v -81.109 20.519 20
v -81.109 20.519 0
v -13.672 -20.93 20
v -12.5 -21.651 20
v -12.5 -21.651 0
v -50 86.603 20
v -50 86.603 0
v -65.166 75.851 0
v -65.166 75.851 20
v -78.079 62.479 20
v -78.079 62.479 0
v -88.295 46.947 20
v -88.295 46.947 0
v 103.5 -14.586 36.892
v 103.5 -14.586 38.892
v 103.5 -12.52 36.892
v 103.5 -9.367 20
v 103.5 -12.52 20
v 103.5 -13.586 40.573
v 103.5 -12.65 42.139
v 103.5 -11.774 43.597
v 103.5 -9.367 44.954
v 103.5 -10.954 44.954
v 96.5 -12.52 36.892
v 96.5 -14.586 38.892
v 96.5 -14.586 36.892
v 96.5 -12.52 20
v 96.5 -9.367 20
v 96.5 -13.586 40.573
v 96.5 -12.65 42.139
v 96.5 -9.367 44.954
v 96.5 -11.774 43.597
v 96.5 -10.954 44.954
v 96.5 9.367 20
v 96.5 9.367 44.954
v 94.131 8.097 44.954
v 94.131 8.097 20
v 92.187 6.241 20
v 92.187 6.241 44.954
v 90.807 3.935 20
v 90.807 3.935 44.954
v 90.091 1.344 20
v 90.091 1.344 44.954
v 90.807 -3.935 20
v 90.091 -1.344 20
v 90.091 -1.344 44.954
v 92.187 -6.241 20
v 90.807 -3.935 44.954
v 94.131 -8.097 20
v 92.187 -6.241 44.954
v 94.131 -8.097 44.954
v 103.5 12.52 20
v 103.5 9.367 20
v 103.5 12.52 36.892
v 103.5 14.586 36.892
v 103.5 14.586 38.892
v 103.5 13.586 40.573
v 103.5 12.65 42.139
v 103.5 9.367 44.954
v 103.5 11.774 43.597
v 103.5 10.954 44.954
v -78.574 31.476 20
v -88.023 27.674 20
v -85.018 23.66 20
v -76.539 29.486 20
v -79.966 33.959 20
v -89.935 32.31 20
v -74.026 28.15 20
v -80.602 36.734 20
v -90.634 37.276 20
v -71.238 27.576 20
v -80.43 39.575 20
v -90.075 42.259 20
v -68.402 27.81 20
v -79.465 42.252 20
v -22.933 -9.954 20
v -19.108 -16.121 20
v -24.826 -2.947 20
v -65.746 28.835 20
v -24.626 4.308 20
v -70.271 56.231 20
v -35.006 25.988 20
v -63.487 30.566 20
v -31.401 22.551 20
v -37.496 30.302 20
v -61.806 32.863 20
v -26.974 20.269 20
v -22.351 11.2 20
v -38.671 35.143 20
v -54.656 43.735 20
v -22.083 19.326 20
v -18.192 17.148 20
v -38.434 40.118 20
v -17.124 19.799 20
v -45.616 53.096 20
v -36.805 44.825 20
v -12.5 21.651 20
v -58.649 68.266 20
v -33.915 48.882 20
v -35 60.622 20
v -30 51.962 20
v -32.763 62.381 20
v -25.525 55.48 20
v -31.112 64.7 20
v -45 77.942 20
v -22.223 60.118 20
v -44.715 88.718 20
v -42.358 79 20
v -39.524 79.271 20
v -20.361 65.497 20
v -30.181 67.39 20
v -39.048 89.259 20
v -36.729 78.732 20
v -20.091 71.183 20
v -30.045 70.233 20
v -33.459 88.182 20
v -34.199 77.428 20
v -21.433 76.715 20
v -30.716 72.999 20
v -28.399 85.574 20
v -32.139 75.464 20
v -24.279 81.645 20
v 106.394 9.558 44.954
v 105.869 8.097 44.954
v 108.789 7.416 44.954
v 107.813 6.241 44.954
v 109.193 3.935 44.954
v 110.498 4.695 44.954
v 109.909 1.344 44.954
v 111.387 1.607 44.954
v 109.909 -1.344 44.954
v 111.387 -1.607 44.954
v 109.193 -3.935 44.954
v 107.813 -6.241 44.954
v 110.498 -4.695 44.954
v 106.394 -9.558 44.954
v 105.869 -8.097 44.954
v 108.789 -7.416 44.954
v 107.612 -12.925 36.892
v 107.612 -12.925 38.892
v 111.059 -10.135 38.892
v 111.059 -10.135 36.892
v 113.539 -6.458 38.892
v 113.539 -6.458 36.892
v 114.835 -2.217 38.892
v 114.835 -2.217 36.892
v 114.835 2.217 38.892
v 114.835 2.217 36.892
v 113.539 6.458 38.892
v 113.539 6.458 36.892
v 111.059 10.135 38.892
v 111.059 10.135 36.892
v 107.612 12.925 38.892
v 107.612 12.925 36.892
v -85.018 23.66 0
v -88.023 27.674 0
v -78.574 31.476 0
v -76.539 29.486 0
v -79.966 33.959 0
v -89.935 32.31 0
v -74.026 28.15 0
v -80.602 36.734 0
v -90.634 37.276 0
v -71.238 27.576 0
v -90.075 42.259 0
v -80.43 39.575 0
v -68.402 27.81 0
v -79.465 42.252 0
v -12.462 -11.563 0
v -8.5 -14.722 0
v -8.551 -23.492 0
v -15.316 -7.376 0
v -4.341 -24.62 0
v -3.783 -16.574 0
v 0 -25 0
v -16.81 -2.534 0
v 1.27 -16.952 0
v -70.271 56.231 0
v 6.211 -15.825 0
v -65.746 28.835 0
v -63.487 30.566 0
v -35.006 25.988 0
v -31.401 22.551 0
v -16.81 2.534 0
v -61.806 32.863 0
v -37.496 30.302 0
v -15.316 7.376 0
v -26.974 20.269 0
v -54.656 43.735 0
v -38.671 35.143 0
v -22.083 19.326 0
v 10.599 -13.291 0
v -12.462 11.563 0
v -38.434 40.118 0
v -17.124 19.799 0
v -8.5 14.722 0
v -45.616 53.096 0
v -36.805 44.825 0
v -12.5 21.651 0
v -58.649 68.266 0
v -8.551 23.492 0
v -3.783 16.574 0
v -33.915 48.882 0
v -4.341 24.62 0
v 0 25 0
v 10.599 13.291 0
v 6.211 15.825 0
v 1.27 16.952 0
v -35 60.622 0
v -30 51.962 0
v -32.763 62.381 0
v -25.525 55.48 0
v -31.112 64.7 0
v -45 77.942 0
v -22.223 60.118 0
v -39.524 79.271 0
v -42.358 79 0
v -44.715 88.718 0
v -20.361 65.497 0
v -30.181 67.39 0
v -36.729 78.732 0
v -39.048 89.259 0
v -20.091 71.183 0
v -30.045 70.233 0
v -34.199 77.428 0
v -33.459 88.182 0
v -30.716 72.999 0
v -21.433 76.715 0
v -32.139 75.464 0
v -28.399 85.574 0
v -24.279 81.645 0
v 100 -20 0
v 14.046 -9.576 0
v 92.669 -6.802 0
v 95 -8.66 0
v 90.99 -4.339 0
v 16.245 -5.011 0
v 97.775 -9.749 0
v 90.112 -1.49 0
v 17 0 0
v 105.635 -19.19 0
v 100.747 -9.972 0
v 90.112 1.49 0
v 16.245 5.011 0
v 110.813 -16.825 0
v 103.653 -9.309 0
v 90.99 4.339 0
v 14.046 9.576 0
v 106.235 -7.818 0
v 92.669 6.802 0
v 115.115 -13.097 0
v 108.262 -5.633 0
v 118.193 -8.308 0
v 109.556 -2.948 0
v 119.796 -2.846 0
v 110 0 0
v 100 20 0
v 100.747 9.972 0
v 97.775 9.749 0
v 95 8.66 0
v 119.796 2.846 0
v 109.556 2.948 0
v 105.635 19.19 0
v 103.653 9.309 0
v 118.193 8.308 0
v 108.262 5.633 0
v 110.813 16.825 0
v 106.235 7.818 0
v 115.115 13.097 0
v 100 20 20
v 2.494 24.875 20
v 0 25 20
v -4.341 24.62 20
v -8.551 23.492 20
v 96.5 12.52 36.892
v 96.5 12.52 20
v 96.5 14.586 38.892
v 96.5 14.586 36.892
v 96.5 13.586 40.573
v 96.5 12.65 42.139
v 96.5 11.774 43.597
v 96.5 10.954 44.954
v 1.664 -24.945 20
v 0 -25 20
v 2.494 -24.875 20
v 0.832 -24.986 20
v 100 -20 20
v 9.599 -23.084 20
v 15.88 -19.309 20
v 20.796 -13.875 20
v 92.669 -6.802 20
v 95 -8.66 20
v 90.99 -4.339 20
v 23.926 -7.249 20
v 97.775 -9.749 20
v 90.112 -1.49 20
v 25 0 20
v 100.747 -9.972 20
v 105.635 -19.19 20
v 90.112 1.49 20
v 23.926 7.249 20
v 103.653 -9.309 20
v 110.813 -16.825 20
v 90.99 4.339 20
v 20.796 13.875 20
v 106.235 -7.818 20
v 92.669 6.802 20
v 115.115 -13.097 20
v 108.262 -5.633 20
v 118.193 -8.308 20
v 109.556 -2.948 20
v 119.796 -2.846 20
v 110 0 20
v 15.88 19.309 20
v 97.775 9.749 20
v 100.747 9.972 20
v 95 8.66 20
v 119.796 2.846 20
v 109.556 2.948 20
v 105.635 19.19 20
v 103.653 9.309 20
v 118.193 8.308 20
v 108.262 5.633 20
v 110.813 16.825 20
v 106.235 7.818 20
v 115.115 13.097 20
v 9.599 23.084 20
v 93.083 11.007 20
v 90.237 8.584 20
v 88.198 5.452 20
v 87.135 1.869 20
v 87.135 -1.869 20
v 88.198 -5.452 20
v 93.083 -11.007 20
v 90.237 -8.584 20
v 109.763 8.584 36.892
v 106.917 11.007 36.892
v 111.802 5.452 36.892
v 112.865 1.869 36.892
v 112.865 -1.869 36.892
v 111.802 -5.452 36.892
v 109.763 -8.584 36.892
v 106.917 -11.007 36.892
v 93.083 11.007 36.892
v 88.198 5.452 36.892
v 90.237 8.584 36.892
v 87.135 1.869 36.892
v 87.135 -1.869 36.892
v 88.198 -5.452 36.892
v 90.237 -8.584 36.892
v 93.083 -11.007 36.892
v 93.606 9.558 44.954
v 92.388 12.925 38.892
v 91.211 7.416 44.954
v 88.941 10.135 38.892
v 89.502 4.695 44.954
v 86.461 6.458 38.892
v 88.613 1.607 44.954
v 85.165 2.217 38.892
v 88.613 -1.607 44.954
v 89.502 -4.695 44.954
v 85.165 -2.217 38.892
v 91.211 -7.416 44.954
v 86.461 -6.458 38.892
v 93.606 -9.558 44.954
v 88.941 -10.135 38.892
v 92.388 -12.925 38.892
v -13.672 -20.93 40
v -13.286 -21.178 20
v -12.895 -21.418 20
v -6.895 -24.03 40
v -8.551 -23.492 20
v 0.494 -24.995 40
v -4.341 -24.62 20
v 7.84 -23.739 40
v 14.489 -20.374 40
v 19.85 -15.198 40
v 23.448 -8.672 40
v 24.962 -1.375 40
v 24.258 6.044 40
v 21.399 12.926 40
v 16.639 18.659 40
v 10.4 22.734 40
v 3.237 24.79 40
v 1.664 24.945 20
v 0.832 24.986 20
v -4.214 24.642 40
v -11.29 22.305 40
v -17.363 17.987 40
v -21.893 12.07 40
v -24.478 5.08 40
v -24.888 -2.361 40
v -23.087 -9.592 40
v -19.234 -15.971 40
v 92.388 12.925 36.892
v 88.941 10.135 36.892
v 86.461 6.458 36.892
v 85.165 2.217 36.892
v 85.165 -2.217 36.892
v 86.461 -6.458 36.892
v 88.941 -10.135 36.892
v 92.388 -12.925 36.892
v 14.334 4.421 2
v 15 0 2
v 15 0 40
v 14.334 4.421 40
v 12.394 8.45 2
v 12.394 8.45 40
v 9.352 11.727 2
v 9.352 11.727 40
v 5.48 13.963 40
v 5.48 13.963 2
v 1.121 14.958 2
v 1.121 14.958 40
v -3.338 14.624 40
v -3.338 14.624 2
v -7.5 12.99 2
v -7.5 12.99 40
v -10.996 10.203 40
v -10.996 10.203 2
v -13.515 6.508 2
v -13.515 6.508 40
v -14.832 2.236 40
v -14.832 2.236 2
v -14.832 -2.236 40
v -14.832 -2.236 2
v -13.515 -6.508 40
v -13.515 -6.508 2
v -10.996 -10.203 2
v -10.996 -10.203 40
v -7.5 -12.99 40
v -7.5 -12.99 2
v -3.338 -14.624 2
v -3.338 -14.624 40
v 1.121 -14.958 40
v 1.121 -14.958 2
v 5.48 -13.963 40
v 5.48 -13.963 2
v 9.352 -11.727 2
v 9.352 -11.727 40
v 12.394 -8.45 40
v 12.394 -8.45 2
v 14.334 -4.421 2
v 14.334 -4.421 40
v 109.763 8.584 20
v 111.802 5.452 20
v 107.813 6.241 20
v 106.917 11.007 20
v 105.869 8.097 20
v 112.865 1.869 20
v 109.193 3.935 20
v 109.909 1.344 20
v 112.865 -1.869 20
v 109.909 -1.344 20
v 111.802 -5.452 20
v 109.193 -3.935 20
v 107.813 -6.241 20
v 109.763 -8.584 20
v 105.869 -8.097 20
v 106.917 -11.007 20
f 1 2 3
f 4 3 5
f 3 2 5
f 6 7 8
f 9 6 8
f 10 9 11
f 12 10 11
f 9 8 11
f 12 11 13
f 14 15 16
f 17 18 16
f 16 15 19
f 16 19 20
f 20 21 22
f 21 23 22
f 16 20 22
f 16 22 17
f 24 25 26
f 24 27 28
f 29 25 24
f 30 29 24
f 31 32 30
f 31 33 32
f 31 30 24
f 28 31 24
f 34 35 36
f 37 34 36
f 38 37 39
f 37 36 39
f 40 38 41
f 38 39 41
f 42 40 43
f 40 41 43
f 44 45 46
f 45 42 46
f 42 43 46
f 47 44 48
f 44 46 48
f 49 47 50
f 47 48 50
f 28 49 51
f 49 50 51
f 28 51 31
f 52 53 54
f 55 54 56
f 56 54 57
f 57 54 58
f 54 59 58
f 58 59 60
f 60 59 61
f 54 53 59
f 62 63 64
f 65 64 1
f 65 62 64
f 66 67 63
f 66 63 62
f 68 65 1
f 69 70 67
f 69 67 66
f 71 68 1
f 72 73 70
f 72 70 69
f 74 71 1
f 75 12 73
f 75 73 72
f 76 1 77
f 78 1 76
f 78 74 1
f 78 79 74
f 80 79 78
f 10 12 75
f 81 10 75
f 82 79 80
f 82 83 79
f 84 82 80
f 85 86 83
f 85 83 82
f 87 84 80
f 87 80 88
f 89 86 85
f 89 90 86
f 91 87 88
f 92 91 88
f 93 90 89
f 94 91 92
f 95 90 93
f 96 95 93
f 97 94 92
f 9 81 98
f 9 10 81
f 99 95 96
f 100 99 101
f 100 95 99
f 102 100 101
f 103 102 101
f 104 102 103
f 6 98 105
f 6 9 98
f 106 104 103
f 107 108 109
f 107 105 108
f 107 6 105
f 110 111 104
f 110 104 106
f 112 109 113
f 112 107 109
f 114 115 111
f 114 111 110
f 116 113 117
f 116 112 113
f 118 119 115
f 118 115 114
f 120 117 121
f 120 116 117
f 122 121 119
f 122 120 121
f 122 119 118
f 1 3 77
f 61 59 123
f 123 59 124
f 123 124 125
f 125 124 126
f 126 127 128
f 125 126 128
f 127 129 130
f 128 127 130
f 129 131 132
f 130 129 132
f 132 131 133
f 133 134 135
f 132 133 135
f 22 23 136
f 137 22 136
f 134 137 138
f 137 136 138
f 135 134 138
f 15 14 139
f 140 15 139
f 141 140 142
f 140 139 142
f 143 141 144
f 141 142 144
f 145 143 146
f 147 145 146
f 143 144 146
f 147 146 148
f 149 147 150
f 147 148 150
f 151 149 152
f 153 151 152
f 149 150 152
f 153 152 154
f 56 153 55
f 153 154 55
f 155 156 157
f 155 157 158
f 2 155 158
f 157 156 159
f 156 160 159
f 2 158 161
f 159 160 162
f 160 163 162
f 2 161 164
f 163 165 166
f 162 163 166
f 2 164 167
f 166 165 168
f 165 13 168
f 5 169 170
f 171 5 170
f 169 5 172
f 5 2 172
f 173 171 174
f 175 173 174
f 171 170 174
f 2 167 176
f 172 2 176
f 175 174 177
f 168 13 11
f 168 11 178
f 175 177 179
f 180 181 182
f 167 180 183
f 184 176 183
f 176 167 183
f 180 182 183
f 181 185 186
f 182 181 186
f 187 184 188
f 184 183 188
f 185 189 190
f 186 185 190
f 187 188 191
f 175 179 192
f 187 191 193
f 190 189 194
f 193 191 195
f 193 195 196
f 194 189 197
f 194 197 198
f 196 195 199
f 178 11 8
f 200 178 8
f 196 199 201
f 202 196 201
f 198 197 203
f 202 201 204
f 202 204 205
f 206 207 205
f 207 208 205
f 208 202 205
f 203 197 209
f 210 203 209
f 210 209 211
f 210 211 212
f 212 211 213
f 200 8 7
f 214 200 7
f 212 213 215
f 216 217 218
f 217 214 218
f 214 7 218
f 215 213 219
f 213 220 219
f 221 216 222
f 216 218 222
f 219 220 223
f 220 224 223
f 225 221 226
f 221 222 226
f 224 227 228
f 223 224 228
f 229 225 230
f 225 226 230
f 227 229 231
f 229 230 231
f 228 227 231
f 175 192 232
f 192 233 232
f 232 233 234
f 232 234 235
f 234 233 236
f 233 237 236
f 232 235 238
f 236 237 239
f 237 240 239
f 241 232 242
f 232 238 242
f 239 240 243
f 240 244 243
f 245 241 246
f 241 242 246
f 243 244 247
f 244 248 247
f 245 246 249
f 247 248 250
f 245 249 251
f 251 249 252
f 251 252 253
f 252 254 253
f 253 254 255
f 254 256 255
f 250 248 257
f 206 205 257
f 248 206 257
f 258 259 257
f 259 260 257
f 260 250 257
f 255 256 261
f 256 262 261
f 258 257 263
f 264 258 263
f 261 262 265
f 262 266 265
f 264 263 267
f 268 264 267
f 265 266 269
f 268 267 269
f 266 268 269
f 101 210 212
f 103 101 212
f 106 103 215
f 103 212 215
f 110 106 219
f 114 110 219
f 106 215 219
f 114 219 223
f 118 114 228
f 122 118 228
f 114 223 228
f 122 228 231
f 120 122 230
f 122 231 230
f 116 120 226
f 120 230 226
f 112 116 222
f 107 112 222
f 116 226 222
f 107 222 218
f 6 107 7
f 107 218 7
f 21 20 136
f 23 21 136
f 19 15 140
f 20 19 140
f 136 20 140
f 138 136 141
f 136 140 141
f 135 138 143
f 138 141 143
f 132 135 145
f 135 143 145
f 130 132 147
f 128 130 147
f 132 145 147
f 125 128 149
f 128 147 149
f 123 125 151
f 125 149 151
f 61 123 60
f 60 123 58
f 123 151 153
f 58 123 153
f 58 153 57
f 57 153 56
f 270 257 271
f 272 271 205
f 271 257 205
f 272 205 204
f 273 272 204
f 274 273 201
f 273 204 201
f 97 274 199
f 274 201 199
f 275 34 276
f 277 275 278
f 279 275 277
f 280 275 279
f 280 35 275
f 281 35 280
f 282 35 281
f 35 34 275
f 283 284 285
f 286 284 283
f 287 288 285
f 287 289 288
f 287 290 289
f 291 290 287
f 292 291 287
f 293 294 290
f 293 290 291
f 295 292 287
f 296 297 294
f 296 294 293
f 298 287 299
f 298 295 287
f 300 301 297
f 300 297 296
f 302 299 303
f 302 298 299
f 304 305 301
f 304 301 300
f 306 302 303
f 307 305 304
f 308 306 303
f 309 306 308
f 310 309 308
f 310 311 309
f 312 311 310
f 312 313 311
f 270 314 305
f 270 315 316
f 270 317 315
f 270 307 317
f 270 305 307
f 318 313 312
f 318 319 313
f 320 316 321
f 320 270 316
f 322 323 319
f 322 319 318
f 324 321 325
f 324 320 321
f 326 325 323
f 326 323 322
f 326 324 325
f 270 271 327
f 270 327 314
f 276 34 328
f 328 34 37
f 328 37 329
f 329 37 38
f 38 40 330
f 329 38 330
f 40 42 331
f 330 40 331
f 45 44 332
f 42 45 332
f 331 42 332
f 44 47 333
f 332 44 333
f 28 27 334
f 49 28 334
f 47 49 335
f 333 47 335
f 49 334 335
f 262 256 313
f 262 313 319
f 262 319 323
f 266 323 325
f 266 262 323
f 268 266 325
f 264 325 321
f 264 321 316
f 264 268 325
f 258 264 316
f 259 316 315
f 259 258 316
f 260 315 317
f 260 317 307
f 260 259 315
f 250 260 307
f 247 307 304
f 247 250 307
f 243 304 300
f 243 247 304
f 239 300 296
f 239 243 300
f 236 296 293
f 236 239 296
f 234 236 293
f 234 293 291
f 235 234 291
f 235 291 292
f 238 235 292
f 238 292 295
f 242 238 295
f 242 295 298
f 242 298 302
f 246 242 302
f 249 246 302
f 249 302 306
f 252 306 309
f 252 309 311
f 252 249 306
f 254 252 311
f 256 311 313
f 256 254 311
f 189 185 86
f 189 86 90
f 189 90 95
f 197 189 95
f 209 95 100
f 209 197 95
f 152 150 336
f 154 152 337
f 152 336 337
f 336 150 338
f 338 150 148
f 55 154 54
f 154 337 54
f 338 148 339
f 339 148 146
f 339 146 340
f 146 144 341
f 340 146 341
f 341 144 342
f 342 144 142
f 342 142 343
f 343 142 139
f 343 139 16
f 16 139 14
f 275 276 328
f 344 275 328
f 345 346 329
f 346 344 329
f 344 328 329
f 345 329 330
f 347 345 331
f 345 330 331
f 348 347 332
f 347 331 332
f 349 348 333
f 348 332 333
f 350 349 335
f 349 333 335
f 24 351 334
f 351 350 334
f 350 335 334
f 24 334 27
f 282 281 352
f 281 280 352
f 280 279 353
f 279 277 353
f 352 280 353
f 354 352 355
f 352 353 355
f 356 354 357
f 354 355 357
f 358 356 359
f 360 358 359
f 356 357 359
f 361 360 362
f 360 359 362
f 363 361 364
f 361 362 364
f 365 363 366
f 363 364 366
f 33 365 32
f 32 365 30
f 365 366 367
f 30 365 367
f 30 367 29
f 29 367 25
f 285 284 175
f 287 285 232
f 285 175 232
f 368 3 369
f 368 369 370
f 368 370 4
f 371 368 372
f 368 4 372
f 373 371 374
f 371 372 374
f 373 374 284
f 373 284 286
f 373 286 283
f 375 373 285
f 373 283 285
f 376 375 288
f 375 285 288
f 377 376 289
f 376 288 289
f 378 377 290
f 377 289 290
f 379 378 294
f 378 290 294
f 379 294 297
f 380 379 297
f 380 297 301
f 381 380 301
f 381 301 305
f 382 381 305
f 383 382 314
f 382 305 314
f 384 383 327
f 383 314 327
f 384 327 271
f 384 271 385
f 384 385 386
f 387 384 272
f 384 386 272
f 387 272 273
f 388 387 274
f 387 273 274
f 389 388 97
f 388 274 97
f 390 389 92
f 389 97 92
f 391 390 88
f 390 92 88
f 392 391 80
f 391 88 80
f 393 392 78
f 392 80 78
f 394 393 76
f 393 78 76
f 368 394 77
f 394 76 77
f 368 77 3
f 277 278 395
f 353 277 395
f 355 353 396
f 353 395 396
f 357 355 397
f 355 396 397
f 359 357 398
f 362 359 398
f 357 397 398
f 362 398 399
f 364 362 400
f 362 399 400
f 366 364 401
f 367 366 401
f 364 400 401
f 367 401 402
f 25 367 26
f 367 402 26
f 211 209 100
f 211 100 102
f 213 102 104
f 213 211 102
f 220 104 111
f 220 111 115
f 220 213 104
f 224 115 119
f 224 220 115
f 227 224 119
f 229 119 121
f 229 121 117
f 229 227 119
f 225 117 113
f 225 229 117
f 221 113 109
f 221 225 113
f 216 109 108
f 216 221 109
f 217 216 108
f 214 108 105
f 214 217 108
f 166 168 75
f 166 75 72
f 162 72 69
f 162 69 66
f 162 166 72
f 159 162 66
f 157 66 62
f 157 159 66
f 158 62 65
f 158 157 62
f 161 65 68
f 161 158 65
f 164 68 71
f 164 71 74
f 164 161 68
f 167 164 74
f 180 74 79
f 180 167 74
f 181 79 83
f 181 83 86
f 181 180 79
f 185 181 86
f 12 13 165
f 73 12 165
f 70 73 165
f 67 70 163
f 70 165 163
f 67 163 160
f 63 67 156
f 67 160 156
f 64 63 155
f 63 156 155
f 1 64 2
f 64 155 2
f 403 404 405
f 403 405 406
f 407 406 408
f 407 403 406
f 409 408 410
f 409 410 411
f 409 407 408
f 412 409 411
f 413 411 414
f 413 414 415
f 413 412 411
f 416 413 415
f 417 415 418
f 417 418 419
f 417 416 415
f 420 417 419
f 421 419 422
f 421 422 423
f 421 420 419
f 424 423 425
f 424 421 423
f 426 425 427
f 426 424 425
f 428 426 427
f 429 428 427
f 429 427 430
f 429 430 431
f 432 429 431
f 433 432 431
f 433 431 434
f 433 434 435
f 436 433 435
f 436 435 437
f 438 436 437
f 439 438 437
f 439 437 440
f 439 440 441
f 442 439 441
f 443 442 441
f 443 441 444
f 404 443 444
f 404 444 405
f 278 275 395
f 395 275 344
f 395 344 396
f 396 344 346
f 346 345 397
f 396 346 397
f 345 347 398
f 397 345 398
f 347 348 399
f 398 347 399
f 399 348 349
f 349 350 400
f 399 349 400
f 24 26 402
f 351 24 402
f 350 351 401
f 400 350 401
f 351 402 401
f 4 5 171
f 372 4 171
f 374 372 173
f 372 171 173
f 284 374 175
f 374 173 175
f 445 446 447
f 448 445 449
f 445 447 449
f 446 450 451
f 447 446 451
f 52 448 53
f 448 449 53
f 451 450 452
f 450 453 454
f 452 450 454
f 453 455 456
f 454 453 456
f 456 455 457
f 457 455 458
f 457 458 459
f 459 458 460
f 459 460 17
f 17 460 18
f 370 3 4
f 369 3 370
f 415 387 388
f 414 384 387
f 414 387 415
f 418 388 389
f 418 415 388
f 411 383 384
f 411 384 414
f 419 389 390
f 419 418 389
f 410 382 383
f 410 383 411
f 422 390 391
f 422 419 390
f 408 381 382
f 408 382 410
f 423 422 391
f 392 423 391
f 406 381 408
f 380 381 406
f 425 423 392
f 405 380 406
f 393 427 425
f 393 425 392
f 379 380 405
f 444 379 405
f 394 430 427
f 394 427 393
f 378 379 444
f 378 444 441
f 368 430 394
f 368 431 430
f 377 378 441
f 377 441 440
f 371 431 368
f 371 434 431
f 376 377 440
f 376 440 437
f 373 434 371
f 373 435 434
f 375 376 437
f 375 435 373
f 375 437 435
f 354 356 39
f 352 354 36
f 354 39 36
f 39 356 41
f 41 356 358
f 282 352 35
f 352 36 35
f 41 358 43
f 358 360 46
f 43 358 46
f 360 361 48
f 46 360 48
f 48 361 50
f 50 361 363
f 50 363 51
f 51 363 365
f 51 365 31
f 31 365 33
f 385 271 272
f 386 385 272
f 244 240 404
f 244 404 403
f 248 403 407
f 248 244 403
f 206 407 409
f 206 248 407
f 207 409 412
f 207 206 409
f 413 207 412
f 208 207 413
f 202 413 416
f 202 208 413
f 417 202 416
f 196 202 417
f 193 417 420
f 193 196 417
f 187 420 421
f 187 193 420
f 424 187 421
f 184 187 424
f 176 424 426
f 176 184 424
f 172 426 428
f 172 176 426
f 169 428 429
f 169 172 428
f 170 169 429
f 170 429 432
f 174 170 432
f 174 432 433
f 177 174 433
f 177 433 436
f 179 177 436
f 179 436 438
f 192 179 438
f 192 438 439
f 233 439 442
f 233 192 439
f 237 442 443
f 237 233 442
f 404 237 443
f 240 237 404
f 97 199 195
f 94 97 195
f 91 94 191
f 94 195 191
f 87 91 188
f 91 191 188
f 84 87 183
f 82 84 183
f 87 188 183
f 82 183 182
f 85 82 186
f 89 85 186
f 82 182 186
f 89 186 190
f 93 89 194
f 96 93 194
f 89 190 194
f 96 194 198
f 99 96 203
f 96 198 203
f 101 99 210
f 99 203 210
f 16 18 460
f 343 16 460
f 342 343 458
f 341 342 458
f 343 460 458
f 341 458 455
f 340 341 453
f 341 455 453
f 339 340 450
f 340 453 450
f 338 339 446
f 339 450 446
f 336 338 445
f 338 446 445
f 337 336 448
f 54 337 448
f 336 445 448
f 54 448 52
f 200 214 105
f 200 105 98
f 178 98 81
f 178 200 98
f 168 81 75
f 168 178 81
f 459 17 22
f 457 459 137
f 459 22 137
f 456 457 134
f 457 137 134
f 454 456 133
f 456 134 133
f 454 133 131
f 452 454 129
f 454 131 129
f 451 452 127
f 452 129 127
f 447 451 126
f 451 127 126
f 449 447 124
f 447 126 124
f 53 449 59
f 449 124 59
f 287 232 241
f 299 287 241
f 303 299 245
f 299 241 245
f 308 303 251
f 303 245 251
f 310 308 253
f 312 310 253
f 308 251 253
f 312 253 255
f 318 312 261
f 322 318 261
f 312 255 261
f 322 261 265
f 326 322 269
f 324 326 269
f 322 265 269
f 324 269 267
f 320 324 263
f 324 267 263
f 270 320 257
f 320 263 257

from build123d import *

# Parameters (mm, degrees)
ESQUISSE1_R             = 15
ESQUISSE1_R_2           = 10
BOSS_EXTRU_1_DEPTH      = 20
ESQUISSE2_R             = 25
ESQUISSE2_R_2           = 15
BOSS_EXTRU_2_DEPTH      = 20
CHANFREIN1_SIZE         = 2
ESQUISSE6_W             = 7
ESQUISSE6_H             = 34.355221185
ENL_V_MAT_EXTRU_2_DEPTH = 25


with BuildPart() as part:
    # Esquisse1 → Boss.-Extru.1 (new body)
    with BuildSketch(Plane.XY):
        with BuildLine():
            Line((0, -25), (100, -20))
            ThreePointArc((100, -20), (120, 0), (100, 20))
            Line((100, 20), (0, 25))
            ThreePointArc((0, 25), (-6.470476128, 24.148145657), (-12.5, 21.650635095))
            ThreePointArc((-12.5, 21.650635095), (-36.405444566, 28.056079661), (-30, 51.961524227))
            ThreePointArc((-30, 51.961524227), (-22.679491924, 79.282032303), (-50, 86.602540378))
            ThreePointArc((-50, 86.602540378), (-71.933980034, 69.465837046), (-88.294759286, 46.947156279))
            ThreePointArc((-88.294759286, 46.947156279), (-89.935062951, 32.30998872), (-81.108547088, 20.518895133))
            Line((-81.108547088, 20.518895133), (-12.5, -21.650635095))
            ThreePointArc((-12.5, -21.650635095), (-6.470476128, -24.148145657), (0, -25))
        make_face()
        Circle(ESQUISSE1_R, mode=Mode.SUBTRACT)
        with Locations((100, 0)):
            Circle(ESQUISSE1_R_2, mode=Mode.SUBTRACT)
        with BuildLine():
            ThreePointArc((-45, 77.942286341), (-64.74058203, 62.519253341), (-79.465283357, 42.252440651))
            ThreePointArc((-79.465283357, 42.252440651), (-75.330523057, 28.728249094), (-61.8063315, 32.863009395))
            ThreePointArc((-61.8063315, 32.863009395), (-50.353786024, 48.626085932), (-35, 60.621778265))
            ThreePointArc((-35, 60.621778265), (-31.339745962, 74.282032303), (-45, 77.942286341))
        make_face(mode=Mode.SUBTRACT)
    extrude(amount=BOSS_EXTRU_1_DEPTH)

    # Esquisse2 → Boss.-Extru.2 (add)
    with BuildSketch(Plane.XY.offset(20)):
        with Locations(Location((0, 0, 0), (0, 0, 236.846938275))):
            Circle(ESQUISSE2_R)
        Circle(ESQUISSE2_R_2, mode=Mode.SUBTRACT)
    extrude(amount=BOSS_EXTRU_2_DEPTH)

    # Chanfrein1
    chanfrein1_edges = [part.edges().sort_by_distance(p)[0] for p in [
        (-15, 0, 0),
    ]]
    chamfer(chanfrein1_edges, length=CHANFREIN1_SIZE)


with BuildPart() as body_2:
    # Esquisse5 → Révolution3 (revolve)
    with BuildSketch(Plane(origin=(100, 0, 0), x_dir=(0, 0, -1), z_dir=(1, 0, 0)), mode=Mode.PRIVATE) as r_volution3_sk:
        Polygon((-20, 10), (-44.953757377, 10), (-44.953757377, 11.5), (-38.891579551, 15), (-36.891579551, 15), (-36.891579551, 13), (-20, 13), align=None)
    revolve(r_volution3_sk.sketch.rotate(Axis((100, 0, 0), (0, 0, 1)), 90), axis=Axis((100, 0, 0), (0, 0, 1)))

    # Esquisse6 → Enlèv. mat.-Extru.2 (cut)
    with BuildSketch(Plane.XY.offset(44.953757377)):
        with Locations((100, -1.163018811)):
            Rectangle(ESQUISSE6_W, ESQUISSE6_H)
    extrude(amount=-ENL_V_MAT_EXTRU_2_DEPTH, mode=Mode.SUBTRACT)


with BuildPart() as enl_v_mat_extru_2_piece_1:
    # of the separate pieces the step leaves, piece 1, a body of its own (enl_v_mat_extru_2_pieces)
    add(body_2.part.solids().sort_by_distance((96.5, 9.367496998, 44.953757377))[0])


with BuildPart() as enl_v_mat_extru_2_piece_2:
    # of the separate pieces the step leaves, piece 2, a body of its own (enl_v_mat_extru_2_pieces)
    add(body_2.part.solids().sort_by_distance((103.5, -9.367496998, 20))[0])


solid = Compound([part.part, enl_v_mat_extru_2_piece_1.part, enl_v_mat_extru_2_piece_2.part])
